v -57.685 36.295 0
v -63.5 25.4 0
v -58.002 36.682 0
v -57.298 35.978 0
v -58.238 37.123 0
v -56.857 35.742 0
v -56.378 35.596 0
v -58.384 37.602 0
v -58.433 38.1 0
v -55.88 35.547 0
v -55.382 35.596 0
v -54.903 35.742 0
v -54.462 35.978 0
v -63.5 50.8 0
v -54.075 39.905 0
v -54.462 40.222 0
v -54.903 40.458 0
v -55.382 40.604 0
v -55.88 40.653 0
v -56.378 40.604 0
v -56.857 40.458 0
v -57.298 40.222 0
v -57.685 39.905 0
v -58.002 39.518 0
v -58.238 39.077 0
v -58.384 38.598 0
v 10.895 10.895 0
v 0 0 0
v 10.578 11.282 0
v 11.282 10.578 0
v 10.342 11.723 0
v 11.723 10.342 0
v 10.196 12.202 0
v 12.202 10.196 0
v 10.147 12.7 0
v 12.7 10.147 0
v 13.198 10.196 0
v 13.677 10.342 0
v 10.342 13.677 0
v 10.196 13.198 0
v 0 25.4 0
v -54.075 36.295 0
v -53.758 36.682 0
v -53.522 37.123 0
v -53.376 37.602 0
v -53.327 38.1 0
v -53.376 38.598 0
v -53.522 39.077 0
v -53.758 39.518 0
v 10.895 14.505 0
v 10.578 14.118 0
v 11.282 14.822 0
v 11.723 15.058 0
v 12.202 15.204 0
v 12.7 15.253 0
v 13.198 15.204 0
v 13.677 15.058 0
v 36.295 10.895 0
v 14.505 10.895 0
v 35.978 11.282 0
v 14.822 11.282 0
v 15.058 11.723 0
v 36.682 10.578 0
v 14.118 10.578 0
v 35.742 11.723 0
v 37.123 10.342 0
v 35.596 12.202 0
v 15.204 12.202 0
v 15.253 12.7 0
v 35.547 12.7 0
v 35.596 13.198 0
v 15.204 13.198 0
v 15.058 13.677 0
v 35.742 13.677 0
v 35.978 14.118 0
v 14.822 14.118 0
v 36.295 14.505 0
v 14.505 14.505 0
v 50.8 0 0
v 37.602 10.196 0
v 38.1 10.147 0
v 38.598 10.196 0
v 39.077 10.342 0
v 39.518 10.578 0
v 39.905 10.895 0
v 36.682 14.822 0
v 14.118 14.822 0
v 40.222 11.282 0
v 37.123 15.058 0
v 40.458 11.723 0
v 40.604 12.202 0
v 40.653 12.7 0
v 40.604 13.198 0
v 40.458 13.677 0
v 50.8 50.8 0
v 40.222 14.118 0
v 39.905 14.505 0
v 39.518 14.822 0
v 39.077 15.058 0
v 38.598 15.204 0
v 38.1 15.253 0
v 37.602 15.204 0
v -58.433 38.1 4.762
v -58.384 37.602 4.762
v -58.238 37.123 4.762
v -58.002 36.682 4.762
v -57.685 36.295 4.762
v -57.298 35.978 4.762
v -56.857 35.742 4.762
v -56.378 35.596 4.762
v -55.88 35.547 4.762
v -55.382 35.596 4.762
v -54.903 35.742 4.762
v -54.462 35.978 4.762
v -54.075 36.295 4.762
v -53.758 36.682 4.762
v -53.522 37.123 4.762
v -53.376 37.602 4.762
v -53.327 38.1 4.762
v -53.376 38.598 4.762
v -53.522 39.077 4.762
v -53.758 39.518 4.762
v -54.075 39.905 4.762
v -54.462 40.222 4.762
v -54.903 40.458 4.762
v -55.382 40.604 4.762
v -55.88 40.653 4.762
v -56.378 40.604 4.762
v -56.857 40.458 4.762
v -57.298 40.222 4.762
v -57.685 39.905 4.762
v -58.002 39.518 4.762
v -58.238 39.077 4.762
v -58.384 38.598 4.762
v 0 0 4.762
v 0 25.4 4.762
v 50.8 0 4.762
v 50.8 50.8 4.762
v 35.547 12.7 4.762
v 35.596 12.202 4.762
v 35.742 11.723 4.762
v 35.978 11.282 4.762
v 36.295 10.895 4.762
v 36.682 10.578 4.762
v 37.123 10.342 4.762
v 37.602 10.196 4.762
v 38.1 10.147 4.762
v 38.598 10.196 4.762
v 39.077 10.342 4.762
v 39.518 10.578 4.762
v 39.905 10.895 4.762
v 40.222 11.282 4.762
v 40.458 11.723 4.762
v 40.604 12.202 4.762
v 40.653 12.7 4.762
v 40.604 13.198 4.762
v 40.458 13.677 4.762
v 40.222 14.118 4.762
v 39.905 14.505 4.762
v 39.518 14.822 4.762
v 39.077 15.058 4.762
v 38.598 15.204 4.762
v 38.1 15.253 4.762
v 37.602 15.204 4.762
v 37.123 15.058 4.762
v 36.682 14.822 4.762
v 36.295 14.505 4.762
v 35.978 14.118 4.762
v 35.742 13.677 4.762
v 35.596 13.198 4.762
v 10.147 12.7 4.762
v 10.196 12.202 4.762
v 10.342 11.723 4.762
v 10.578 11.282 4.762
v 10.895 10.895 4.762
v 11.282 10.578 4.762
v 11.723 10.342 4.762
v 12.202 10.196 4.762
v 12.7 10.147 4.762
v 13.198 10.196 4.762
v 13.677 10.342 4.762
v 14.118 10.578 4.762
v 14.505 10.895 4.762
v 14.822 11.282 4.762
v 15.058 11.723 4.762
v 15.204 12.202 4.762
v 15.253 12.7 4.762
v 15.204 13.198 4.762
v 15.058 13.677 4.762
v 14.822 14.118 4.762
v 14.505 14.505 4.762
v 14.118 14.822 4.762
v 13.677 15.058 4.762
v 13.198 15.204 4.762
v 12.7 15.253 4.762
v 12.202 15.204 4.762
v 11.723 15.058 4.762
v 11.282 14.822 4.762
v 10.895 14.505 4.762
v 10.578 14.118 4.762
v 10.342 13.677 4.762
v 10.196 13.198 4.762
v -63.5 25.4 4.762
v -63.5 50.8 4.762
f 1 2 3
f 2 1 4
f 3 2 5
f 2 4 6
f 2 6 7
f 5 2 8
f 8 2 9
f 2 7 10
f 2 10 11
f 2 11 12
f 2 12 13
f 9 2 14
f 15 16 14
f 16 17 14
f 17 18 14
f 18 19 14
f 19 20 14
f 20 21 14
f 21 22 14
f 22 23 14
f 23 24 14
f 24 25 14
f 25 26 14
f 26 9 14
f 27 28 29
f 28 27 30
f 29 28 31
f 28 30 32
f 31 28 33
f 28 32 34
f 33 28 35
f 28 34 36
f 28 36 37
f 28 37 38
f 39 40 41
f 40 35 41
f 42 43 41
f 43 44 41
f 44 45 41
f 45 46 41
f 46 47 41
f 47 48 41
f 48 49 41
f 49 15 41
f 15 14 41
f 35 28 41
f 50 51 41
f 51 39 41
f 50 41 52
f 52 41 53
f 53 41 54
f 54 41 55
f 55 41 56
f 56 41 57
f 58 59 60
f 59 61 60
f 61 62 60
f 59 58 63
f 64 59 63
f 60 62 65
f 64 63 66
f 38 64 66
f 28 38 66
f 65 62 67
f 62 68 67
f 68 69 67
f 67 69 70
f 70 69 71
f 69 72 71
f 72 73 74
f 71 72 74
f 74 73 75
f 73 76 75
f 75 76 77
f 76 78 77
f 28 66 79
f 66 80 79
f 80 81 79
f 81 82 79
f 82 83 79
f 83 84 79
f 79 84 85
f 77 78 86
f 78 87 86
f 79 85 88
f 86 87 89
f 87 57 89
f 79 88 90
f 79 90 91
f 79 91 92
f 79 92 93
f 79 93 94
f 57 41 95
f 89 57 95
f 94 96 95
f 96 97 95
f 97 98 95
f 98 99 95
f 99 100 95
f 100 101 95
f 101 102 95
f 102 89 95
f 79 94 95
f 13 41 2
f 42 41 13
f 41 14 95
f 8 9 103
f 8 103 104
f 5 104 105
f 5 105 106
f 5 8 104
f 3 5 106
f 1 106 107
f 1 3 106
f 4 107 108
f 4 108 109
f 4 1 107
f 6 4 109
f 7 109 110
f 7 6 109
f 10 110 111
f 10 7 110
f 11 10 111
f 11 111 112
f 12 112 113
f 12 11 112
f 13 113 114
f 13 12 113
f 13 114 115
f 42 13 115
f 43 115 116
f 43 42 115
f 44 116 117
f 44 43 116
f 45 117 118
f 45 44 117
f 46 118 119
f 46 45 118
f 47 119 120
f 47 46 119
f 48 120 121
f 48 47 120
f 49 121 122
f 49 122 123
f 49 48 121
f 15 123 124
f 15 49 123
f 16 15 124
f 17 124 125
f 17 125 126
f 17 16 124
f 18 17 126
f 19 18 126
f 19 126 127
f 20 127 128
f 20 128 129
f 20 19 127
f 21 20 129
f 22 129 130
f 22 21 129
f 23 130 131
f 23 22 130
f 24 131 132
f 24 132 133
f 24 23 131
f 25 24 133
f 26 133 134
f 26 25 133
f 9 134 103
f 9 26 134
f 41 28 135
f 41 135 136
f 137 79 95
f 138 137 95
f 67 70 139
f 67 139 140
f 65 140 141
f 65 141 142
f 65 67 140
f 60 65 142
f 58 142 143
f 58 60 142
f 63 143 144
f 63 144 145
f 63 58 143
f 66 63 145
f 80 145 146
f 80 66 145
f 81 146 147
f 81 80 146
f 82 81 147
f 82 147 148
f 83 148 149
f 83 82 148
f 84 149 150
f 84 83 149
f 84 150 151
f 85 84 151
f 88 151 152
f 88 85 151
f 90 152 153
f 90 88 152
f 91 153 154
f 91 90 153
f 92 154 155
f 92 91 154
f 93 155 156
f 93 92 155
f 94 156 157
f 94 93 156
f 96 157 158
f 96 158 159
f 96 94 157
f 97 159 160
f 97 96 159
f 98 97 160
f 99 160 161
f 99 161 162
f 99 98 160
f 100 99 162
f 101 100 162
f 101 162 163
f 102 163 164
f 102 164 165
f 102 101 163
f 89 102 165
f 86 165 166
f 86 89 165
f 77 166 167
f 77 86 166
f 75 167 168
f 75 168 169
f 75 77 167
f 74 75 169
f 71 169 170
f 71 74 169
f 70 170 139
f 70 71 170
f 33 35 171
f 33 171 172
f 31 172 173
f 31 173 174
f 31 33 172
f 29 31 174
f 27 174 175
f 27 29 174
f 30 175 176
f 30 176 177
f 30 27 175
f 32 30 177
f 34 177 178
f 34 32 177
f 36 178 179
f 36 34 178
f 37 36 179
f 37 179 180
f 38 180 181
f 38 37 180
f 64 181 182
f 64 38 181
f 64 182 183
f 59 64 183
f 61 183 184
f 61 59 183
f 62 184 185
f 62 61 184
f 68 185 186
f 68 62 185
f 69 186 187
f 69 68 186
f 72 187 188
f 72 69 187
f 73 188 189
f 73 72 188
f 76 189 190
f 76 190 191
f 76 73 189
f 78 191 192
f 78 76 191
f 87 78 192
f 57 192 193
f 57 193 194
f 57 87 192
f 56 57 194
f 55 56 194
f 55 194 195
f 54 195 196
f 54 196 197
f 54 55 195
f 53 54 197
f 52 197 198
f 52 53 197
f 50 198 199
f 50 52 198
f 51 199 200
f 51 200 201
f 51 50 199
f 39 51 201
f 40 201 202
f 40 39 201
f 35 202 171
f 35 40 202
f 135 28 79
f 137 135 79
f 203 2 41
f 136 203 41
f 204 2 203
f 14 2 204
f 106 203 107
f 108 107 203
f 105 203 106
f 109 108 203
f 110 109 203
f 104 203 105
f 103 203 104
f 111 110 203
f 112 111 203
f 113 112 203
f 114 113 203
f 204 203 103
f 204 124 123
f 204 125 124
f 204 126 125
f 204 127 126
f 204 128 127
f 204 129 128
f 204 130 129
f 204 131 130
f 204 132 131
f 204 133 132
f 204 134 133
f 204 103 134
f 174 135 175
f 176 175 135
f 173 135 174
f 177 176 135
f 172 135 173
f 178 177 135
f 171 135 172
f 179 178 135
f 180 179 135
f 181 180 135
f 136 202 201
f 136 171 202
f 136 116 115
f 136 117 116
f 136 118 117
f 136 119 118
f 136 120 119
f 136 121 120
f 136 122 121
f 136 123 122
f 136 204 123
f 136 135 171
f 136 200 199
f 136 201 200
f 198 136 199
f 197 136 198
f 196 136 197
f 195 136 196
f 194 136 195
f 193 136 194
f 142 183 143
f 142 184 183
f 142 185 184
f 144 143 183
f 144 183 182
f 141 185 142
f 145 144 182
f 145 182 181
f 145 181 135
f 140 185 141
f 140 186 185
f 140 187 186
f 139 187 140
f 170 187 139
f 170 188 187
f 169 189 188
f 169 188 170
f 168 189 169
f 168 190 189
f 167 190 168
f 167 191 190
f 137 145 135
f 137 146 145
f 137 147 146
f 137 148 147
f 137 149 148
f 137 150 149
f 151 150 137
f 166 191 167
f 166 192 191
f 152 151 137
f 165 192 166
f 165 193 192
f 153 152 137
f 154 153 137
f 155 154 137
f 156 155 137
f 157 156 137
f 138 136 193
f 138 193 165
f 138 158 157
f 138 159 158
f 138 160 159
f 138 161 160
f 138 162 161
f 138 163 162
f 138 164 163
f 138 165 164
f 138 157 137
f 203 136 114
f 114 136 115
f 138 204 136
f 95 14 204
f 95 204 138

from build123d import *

# Parameters (mm, degrees)
SKETCH1_W           = 50.8
SKETCH1_H           = 50.8
SKETCH1_R           = 2.5527
SKETCH1_W_2         = 63.5
SKETCH1_H_2         = 25.4
BOSS_EXTRUDE1_DEPTH = 4.7625


with BuildPart() as part:
    # Sketch1 → Boss-Extrude1 (new body)
    # profile 1 of 2: a face of its own
    with BuildSketch(Plane.XY):
        with Locations((25.4, 25.4)):
            Rectangle(SKETCH1_W, SKETCH1_H)
        with Locations(Location((38.1, 12.7, 0), (0, 0, 180))):
            Circle(SKETCH1_R, mode=Mode.SUBTRACT)
        with Locations(Location((12.7, 12.7, 0), (0, 0, 180))):
            Circle(SKETCH1_R, mode=Mode.SUBTRACT)
    # profile 2 of 2: a face of its own
    with BuildSketch(Plane.XY):
        with Locations((-31.75, 38.1)):
            Rectangle(SKETCH1_W_2, SKETCH1_H_2)
        with Locations(Location((-55.88, 38.1, 0), (0, 0, 180))):
            Circle(SKETCH1_R, mode=Mode.SUBTRACT)
    extrude(amount=BOSS_EXTRUDE1_DEPTH)


solid = part.part
